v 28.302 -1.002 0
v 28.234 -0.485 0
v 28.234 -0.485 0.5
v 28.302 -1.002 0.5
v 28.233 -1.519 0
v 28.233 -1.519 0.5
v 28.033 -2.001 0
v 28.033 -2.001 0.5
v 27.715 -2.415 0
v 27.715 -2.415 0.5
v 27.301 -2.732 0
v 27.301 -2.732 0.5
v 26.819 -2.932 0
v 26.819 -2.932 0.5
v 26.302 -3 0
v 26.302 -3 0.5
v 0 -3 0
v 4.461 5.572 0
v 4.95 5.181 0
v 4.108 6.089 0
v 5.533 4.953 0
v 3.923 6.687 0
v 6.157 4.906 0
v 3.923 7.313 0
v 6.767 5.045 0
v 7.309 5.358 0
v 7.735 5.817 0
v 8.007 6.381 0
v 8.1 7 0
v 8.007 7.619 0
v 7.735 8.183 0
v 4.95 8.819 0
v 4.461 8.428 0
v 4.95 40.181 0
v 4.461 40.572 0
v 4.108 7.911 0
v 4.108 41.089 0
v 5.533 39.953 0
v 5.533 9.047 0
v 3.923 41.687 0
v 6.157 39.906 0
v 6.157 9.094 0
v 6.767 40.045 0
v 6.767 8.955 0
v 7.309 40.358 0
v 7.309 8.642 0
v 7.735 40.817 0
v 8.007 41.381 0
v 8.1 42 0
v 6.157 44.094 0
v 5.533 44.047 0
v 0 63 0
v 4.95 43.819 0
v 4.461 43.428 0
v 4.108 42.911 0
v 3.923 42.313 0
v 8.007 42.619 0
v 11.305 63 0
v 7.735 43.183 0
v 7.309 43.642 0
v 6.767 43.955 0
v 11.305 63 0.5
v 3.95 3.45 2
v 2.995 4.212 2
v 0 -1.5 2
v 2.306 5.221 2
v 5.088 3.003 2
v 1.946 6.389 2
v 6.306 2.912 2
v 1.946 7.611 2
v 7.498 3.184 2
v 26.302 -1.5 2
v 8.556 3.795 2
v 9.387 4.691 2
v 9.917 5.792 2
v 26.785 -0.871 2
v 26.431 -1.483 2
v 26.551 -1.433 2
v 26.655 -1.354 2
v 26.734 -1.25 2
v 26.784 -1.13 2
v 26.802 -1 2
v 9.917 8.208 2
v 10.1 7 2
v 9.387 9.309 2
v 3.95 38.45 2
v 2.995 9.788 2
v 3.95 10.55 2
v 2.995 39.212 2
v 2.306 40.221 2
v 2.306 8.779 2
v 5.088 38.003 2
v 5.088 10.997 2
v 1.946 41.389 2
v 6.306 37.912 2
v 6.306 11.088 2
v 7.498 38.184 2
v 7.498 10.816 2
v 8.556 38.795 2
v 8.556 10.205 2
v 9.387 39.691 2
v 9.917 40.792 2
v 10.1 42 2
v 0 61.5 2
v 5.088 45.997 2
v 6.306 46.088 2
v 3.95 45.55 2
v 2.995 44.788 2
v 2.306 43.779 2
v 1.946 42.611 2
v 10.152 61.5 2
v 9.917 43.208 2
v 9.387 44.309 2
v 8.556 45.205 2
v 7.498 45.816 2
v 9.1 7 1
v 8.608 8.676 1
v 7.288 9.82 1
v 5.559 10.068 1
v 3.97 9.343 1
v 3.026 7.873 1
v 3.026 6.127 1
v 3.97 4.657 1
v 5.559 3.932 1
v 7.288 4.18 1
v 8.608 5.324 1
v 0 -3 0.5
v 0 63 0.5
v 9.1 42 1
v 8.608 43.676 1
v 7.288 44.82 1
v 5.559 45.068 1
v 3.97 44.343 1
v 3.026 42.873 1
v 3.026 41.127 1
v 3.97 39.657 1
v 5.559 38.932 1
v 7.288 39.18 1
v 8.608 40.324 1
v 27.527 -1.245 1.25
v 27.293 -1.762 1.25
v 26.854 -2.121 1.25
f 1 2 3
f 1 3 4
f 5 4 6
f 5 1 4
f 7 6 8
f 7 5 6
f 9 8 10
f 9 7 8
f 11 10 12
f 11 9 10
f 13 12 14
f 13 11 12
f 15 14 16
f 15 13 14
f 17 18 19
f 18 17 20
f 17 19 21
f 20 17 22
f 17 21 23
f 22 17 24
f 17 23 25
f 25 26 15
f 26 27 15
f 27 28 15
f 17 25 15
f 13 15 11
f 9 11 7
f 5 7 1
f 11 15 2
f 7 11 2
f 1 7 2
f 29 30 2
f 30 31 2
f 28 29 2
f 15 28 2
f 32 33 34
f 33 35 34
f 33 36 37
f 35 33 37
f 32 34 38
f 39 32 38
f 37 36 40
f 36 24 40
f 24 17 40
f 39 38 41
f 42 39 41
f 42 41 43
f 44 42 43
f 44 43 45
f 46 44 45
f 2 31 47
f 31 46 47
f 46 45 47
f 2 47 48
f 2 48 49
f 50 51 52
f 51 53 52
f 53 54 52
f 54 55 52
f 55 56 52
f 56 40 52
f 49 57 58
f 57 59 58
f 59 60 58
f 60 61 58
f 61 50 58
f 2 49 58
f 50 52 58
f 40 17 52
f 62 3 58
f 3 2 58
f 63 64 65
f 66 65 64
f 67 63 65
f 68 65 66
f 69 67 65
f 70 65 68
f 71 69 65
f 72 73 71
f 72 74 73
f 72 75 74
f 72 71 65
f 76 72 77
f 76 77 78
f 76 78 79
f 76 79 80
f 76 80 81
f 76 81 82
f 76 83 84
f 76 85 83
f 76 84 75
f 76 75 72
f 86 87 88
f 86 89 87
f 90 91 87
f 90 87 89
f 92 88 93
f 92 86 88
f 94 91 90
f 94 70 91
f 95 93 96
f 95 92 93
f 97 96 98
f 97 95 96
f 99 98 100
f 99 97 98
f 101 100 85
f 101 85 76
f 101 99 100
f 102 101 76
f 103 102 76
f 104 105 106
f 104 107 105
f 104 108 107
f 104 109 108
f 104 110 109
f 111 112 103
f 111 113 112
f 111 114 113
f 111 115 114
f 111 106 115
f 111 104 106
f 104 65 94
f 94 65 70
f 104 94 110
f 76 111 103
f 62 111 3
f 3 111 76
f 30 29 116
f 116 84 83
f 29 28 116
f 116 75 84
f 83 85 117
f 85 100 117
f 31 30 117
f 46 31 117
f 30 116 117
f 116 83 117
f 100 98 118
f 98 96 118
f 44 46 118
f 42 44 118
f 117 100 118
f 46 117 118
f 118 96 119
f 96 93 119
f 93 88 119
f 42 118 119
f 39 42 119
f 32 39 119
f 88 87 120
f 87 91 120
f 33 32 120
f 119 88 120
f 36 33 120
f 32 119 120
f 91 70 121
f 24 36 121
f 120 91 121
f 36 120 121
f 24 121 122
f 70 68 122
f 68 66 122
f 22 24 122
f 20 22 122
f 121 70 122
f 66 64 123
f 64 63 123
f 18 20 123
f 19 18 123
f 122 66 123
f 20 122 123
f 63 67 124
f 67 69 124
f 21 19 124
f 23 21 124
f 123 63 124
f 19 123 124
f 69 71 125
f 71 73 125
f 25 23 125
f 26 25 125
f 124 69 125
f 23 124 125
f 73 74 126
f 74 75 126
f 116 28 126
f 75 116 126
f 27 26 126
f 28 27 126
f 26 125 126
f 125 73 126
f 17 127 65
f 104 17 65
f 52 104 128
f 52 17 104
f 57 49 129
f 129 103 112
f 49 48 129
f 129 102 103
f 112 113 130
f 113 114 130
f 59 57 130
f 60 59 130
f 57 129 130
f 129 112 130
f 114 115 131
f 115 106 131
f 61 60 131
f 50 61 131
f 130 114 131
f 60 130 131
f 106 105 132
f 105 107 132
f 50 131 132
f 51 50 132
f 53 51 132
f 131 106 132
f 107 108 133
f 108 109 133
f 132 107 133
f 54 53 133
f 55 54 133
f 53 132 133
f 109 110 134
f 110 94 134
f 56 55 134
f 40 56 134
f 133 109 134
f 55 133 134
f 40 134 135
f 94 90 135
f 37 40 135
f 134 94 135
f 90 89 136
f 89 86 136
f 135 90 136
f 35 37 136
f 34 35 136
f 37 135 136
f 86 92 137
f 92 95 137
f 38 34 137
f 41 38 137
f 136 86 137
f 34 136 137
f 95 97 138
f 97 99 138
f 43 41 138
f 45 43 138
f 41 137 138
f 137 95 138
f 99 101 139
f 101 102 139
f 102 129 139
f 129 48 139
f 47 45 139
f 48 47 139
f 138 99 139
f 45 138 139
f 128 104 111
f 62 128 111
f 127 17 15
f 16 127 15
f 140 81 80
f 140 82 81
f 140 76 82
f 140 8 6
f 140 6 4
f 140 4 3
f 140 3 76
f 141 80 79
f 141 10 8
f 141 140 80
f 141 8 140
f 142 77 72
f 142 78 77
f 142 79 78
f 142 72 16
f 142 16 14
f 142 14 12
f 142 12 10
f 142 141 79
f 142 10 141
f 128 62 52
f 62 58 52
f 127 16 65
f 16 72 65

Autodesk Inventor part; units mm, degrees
ref_plane "YZ Plane" through (0, 0, 0) normal (1, 0, 0) x (0, 1, 0)
ref_plane "XZ Plane" through (0, 0, 0) normal (0, 1, 0) x (-1, 0, 0)
ref_plane "XY Plane" through (0, 0, 0) normal (0, 0, 1) x (1, 0, 0)
sketch "Sketch1" plane through (0, 0, 0) normal (0, 0, 1) x (1, 0, 0)
  line L0 (0, 0) -> (0, 60)
  line L1 (0, 60) -> (9, 60) construction
  line L2 (9, 60) -> (25, 0) construction
  line L3 (25, 0) -> (0, 0) construction
  line L4 (28.2341, -0.4847) -> (11.3048, 63)
  line L5 (11.3048, 63) -> (-3, 63)
  line L6 (-3, 63) -> (-3, -3)
  line L7 (-3, -3) -> (26.3016, -3)
  line L8 (0, 60) -> (0, 63)
  line L9 (0, 0) -> (0, -3)
  arc A0 (26.3016, -3) -> (28.2341, -0.4847) centre (26.3016, -1) ccw
  point P0 (28.9048, -3)
  dimension "d0" = 9
  dimension "d1" = 25
  dimension "d2" = 60
  dimension "d5" = 3
  dimension "d19" = 2
extrude "Extrusion1" add sketch "Sketch1" along normal blind 2 contours L0 L8 L5 L4 A0 L7 L9
chamfer "Chamfer1" distance 1.5 angle 45 4 edges at (19.7695, 31.2577, 2) (27.8876, -2.2185, 2) (13.1508, -3, 2) (5.6524, 63, 2)
sketch "Sketch2" plane through (0, 0, 2) normal (0, 0, 1) x (1, 0, 0)
  line L0 (6, -14.251) -> (6, 80.2953) construction
  line L1 (0, 61.5) -> (0, -1.5) projected
  circle A0 centre (6, 7) radius 2.1
  circle A1 centre (6, 42) radius 2.1
  line L2 (0, -3) -> (26.3016, -3) projected
  point P0 (0, 0)
  point P1 (28.8571, -3)
  dimension "d9" = 6
  dimension "d10" = 4.2
  dimension "d11" = 4.2
  dimension "d12" = 10
  dimension "d13" = 45
extrude "Extrusion2" cut sketch "Sketch2" against normal up to surface (2 mm away)
chamfer "Chamfer2" distance 2 angle 45 2 edges at (3.9, 42, 2) (3.9, 7, 2)
equation "\"d11\" = d10"
properties part number "spazzola - appoggio"
